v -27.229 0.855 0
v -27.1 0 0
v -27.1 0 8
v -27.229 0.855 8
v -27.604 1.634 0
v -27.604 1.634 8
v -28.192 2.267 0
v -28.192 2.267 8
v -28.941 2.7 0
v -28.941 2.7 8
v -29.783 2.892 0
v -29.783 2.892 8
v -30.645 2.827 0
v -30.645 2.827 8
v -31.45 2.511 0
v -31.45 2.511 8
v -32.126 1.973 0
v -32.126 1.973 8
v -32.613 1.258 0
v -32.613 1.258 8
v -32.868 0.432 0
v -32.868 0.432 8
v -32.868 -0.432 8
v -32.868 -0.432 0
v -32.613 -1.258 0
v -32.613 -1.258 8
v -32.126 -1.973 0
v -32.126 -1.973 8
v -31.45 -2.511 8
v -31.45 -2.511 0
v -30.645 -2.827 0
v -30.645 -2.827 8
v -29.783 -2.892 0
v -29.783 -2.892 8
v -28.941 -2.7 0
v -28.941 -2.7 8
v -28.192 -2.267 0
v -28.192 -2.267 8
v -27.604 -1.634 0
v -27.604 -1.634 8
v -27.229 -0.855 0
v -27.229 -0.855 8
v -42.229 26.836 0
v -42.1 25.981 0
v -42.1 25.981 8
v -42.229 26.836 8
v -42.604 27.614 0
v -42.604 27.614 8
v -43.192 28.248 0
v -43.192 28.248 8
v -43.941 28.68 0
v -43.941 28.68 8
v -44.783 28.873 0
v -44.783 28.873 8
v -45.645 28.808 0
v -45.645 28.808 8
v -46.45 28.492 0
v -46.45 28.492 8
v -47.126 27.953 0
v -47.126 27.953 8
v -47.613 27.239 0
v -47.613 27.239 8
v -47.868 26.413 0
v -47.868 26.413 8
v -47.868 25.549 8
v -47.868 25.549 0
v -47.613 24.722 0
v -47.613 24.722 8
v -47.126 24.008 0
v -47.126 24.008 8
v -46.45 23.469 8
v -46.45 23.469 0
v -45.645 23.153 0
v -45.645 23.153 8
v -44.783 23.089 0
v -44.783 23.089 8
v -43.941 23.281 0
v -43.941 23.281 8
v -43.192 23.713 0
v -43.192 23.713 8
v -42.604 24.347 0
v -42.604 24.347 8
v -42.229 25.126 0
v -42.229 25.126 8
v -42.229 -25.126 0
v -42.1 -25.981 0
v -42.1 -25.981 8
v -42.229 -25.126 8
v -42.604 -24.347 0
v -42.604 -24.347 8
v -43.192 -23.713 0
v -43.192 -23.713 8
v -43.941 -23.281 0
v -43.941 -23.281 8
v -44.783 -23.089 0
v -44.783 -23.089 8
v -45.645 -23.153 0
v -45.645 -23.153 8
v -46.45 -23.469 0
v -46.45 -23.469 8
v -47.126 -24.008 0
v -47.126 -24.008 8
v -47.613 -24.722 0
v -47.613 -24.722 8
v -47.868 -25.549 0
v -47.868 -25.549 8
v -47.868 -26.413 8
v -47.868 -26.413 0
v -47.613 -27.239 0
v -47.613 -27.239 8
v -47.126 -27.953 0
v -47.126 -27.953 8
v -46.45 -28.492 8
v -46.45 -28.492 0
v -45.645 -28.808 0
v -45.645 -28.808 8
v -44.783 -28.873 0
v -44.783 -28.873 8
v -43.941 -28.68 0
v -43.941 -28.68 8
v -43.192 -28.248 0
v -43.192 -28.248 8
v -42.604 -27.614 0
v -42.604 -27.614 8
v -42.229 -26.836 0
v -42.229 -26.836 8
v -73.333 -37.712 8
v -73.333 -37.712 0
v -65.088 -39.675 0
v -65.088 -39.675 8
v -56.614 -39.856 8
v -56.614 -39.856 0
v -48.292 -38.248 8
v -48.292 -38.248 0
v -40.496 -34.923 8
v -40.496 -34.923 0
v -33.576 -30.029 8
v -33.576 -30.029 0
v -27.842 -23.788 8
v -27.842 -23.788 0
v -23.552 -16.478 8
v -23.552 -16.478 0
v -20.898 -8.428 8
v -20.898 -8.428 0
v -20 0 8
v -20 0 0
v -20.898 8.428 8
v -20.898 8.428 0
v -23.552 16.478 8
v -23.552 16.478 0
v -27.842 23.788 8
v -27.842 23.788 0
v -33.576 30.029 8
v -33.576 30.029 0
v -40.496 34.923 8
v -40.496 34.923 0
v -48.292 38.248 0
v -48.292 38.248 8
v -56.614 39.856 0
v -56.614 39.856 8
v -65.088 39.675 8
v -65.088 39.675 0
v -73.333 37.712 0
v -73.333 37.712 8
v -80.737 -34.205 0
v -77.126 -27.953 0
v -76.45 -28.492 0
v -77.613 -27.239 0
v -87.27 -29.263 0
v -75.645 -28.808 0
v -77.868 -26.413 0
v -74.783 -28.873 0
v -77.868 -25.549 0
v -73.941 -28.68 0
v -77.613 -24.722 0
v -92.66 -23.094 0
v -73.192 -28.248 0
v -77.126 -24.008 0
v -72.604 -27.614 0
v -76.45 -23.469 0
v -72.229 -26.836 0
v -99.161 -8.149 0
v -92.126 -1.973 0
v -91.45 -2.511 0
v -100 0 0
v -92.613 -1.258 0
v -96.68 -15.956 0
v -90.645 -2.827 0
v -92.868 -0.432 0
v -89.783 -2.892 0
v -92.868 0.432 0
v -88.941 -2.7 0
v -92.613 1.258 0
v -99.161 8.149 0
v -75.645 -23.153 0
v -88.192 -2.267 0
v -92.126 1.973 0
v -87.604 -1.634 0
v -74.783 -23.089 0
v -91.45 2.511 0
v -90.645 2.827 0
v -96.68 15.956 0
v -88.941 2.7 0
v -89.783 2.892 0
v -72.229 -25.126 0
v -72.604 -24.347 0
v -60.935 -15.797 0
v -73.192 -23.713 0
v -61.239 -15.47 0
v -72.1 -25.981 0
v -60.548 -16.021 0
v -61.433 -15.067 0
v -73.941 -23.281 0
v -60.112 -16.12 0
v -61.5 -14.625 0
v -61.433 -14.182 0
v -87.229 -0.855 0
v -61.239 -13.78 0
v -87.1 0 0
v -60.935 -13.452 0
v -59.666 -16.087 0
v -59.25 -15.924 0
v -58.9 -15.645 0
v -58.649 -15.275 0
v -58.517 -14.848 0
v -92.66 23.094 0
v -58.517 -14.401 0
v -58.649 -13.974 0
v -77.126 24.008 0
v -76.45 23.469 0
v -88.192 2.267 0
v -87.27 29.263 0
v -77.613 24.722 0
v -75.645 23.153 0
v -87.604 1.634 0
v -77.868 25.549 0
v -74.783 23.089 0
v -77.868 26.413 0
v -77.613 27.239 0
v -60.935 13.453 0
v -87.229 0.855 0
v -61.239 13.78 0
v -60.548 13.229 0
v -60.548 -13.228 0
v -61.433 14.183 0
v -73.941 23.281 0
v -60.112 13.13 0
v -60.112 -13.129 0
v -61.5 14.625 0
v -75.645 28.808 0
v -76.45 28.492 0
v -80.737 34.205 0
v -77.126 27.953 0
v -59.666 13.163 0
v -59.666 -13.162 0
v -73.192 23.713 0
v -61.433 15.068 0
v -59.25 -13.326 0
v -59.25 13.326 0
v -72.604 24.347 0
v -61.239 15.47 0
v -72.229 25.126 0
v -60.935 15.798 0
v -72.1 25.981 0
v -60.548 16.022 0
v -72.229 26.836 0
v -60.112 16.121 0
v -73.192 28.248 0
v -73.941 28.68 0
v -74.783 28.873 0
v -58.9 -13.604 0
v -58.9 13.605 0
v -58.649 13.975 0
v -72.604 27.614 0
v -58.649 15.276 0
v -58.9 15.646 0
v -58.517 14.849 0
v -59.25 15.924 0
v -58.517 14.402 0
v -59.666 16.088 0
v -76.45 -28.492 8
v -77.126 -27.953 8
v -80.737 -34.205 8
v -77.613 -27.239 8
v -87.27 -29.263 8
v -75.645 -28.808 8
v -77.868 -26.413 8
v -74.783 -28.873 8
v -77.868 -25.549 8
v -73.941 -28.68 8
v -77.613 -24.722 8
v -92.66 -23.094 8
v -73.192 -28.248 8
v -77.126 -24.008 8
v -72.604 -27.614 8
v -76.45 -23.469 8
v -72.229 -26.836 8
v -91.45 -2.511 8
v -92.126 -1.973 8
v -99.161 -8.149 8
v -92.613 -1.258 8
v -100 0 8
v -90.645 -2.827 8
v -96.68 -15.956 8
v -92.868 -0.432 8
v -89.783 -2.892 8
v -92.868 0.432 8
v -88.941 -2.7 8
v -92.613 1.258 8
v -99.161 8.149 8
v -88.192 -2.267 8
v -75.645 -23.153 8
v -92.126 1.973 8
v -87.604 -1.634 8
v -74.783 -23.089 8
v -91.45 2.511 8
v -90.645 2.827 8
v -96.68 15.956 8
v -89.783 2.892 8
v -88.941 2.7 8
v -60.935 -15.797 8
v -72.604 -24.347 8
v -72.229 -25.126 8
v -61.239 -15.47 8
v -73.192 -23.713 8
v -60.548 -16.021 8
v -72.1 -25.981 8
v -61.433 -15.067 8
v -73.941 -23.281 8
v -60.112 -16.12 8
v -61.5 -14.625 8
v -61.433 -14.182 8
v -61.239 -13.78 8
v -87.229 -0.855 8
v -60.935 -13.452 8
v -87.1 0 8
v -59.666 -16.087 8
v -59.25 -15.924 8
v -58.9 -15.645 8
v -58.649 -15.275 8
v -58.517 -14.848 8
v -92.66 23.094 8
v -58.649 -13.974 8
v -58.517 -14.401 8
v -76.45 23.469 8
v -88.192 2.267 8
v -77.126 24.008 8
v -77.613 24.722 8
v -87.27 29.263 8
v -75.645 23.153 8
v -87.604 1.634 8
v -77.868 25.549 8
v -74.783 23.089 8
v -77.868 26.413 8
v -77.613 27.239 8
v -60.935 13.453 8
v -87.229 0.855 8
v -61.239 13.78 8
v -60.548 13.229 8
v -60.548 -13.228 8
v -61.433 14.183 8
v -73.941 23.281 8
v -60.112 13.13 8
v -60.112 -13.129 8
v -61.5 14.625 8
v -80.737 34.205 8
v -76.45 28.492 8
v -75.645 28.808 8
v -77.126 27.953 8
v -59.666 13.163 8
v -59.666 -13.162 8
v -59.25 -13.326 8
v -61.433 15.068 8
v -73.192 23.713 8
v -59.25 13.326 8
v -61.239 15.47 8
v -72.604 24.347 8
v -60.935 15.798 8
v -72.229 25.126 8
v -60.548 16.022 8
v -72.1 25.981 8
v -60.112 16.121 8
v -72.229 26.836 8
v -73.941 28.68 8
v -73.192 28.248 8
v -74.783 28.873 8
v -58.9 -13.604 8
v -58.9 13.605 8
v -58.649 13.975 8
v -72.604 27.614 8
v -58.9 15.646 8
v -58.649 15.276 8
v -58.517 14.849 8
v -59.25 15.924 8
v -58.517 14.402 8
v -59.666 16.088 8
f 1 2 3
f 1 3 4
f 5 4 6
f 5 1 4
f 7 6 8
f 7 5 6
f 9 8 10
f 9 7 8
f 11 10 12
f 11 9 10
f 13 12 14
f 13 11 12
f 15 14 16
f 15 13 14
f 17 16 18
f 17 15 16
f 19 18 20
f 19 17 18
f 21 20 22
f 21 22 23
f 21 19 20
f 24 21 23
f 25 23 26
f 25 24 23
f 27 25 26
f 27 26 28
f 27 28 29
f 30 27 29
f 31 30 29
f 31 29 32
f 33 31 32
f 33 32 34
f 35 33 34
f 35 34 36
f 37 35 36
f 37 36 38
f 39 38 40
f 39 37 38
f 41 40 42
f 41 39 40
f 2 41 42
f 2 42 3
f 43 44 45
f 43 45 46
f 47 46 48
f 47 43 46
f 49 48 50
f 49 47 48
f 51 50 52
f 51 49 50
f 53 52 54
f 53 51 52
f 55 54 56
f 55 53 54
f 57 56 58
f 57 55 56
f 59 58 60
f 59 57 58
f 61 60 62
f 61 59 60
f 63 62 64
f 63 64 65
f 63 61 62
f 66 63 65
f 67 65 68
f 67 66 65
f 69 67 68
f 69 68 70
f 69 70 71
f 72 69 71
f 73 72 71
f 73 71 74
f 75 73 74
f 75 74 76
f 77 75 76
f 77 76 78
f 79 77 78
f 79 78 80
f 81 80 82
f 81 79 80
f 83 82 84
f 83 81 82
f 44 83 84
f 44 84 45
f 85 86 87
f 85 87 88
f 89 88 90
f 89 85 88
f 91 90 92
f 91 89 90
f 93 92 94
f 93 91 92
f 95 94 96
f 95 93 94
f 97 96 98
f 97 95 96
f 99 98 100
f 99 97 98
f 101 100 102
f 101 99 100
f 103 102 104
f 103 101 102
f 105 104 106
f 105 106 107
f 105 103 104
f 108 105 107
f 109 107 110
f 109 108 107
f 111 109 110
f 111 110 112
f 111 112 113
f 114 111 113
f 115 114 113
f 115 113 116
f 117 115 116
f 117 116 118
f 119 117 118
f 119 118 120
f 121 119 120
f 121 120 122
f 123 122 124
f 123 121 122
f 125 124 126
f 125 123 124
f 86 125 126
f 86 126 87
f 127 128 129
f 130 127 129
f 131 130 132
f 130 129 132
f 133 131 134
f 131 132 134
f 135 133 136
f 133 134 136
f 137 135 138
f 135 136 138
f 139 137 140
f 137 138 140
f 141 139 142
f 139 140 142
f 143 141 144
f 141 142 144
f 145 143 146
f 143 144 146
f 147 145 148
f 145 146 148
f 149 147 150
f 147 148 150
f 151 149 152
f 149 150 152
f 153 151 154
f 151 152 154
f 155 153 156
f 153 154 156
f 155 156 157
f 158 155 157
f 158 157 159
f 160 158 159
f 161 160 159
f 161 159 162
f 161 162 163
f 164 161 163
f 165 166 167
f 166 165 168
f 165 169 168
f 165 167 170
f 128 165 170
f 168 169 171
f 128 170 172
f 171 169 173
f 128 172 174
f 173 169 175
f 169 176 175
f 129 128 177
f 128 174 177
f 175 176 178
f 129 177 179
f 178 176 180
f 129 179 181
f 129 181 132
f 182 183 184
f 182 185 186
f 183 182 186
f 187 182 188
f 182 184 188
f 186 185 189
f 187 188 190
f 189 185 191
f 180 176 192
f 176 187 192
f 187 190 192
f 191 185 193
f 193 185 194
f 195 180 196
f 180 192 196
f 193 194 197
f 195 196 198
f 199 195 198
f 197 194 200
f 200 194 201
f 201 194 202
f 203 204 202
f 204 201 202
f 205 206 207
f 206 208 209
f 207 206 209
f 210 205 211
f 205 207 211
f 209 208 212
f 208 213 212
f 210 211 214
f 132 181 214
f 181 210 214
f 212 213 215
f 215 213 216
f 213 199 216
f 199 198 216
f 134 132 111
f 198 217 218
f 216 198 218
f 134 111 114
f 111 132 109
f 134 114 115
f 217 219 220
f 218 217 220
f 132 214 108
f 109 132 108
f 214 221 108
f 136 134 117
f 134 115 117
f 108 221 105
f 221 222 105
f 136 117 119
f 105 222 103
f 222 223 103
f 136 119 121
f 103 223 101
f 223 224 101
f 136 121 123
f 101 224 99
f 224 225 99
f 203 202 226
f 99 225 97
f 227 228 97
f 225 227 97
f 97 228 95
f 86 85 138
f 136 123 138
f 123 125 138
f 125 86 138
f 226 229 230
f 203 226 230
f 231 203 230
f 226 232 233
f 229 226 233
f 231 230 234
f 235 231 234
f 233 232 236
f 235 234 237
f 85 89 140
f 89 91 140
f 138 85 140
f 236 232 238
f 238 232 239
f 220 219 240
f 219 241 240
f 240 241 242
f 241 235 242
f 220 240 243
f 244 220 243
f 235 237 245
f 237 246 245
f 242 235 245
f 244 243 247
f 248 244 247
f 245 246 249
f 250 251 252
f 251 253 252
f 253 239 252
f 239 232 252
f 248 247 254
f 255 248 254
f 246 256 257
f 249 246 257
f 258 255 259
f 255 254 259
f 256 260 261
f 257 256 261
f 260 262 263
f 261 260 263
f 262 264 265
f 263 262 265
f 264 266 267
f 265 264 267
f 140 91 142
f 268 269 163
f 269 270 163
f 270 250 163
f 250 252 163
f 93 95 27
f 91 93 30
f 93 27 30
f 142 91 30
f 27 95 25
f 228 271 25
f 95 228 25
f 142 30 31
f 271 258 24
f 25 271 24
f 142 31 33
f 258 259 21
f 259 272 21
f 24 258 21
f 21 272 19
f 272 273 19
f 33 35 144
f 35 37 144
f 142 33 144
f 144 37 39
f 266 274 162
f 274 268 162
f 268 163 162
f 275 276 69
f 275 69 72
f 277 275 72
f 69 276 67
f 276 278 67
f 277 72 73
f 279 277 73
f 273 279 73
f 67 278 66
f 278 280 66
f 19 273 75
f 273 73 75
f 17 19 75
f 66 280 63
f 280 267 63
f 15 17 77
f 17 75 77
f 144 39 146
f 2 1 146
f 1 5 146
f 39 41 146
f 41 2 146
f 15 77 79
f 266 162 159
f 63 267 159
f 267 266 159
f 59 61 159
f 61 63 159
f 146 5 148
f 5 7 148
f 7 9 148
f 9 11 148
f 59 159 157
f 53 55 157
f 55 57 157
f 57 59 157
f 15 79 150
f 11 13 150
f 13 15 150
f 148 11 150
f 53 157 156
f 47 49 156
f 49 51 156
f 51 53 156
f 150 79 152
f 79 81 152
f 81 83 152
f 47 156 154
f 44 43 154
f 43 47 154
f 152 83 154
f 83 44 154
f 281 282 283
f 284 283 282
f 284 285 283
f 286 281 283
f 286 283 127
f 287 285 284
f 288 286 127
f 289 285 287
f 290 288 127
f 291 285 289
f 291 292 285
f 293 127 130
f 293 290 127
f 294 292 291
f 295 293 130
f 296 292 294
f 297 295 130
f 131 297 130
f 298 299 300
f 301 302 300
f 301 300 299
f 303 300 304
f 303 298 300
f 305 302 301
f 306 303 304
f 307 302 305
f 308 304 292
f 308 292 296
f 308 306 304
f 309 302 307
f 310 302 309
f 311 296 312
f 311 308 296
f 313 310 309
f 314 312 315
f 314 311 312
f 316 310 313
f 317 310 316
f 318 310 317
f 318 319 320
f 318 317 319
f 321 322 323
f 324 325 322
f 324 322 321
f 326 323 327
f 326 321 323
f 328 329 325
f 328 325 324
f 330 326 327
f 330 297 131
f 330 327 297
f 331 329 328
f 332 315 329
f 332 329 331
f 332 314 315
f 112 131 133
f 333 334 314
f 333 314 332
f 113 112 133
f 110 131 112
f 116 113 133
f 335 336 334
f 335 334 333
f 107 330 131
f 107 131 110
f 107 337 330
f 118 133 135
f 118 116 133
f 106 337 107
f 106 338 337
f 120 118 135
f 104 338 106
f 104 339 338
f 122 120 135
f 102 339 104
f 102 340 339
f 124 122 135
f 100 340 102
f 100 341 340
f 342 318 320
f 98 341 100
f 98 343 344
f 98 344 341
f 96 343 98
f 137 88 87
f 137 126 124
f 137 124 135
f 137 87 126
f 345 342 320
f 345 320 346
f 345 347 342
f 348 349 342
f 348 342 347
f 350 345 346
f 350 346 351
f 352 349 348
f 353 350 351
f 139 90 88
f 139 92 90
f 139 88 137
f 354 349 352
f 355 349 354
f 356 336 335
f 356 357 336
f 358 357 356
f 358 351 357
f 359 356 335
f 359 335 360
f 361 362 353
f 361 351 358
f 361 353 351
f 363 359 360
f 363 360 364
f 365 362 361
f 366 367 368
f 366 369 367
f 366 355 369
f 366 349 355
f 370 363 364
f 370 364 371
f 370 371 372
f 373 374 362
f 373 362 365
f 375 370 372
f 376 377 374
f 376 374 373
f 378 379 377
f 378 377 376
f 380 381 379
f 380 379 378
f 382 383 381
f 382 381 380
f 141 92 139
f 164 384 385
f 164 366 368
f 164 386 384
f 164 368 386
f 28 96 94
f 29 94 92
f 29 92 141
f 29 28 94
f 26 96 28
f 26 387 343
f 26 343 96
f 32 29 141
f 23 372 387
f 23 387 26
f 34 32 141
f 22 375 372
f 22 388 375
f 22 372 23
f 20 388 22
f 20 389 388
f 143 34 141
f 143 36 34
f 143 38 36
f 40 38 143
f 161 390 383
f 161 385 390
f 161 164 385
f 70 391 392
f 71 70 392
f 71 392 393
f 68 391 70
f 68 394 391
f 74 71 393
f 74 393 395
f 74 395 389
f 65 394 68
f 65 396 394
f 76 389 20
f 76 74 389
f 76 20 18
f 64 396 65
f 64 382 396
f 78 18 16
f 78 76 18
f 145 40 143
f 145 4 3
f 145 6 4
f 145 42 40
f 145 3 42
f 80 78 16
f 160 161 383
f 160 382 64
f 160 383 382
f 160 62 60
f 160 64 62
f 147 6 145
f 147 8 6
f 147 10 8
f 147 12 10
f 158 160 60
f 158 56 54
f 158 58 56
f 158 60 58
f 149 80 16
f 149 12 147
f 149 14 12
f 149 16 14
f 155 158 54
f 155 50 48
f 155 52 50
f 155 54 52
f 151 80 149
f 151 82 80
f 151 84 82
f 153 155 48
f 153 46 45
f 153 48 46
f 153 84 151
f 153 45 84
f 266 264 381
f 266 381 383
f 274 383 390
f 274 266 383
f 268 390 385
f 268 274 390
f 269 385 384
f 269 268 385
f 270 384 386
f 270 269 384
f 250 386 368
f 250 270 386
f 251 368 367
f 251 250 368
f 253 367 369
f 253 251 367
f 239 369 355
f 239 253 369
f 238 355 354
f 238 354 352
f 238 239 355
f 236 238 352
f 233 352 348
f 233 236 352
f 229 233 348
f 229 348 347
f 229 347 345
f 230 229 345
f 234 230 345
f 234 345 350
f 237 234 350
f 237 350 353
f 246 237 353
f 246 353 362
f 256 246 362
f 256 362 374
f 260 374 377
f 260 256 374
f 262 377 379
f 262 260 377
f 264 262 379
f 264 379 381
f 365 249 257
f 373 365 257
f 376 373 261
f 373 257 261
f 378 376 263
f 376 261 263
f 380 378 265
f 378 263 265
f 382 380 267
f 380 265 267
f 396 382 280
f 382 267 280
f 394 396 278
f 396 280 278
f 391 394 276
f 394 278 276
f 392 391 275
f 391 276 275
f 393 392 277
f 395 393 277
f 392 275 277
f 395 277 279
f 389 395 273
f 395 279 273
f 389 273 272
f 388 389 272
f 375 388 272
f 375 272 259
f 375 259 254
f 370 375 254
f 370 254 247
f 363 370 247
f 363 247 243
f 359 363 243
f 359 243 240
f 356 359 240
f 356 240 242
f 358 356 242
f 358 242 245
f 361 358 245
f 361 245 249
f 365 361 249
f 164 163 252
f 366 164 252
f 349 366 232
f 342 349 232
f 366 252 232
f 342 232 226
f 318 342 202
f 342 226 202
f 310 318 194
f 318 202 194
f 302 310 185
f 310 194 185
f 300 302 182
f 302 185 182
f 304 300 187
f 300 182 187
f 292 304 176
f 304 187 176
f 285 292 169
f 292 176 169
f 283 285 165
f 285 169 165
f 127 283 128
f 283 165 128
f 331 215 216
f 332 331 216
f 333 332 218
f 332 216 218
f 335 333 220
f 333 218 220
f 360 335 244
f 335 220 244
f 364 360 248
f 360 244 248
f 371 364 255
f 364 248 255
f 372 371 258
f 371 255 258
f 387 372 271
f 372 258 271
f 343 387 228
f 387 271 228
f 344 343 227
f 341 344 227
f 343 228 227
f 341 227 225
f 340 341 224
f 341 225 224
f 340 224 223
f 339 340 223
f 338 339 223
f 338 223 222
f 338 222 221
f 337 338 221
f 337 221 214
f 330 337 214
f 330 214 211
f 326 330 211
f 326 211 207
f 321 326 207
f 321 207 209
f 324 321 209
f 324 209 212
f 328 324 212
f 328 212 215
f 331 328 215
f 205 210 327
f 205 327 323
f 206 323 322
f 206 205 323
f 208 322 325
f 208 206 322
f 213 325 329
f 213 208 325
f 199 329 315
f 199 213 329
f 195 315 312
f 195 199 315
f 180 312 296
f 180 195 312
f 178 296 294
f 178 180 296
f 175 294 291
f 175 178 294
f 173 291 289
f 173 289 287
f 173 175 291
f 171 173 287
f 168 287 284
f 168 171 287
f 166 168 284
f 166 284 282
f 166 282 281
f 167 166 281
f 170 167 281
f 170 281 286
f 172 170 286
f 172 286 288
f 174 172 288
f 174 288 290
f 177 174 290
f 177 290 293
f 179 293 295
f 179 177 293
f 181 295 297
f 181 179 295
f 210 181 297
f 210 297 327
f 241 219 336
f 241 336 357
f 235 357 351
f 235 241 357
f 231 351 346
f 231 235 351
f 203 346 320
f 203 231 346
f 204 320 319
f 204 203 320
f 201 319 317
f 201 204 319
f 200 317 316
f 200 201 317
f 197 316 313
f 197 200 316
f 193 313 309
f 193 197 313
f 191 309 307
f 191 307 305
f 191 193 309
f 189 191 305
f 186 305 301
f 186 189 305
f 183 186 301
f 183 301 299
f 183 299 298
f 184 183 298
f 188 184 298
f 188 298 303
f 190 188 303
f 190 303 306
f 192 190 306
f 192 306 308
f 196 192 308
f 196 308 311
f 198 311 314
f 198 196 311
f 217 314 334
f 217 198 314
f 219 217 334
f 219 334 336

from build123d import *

# Parameters (mm, degrees)
BOSS_EXTRU_1_DEPTH       = 8
ENL_V_START              = -10
ESQUISSE2_R              = 120
ENL_V_MAT_EXTRU_1_DEPTH  = 10
D_GAGEMENT_M51_OUTLINE_R = 2.9
D_GAGEMENT_M51_DEPTH     = 8
ESQUISSE5_R              = 1.5
ENL_V_MAT_EXTRU_2_DEPTH  = 10


# Read off the part's stored shape, not the designer's step: Dégagement M51
with BuildPart() as part:
    # Esquisse1 → Boss.-Extru.1 (new body)
    with BuildSketch(Plane.XY):
        with BuildLine():
            Line((-20, 56.568542495), (-73.333333333, 37.712361663))
            ThreePointArc((-73.333333333, 37.712361663), (-100, 0), (-73.333333333, -37.712361663))
            Line((-73.333333333, -37.712361663), (-20, -56.568542495))
            ThreePointArc((-20, -56.568542495), (34.641016151, -48.989794856), (60, 0))
            ThreePointArc((60, 0), (34.641016151, 48.989794856), (-20, 56.568542495))
        make_face()
    extrude(amount=BOSS_EXTRU_1_DEPTH)

    # Esquisse2 → Enlèv. mat.-Extru.1 (cut)
    with BuildSketch(Plane.XY.offset(8).offset(ENL_V_START)):
        with Locations((-60, 0)):
            Circle(ESQUISSE2_R)
        with BuildLine():
            ThreePointArc((-73.333333333, 37.712361663), (-100, 0), (-73.333333333, -37.712361663))
            ThreePointArc((-73.333333333, -37.712361663), (-20, 0), (-73.333333333, 37.712361663))
        make_face(mode=Mode.SUBTRACT)
    extrude(amount=ENL_V_MAT_EXTRU_1_DEPTH, mode=Mode.SUBTRACT)

    # Dégagement M51 outline → Dégagement M51 (cut)
    with BuildSketch(Plane.XY):
        with Locations((-90, 0)):
            Circle(D_GAGEMENT_M51_OUTLINE_R)
        with Locations((-75, -25.980762114)):
            Circle(D_GAGEMENT_M51_OUTLINE_R)
        with Locations((-45, -25.980762114)):
            Circle(D_GAGEMENT_M51_OUTLINE_R)
        with Locations((-30, 0)):
            Circle(D_GAGEMENT_M51_OUTLINE_R)
        with Locations((-45, 25.980762114)):
            Circle(D_GAGEMENT_M51_OUTLINE_R)
        with Locations((-75, 25.980762114)):
            Circle(D_GAGEMENT_M51_OUTLINE_R)
    extrude(amount=D_GAGEMENT_M51_DEPTH, mode=Mode.SUBTRACT)

    # Esquisse5 → Enlèv. mat.-Extru.2 (cut)
    with BuildSketch(Plane(origin=(819.686269666, 1346.410161514, 0), x_dir=(0, -1, 0), z_dir=(0, 0, -1))):
        with Locations(Location((1331.784714909, 879.686269666, 0), (0, 0, 90))):
            Circle(ESQUISSE5_R)
        with Locations(Location((1361.034715705, 879.686269666, 0), (0, 0, 90))):
            Circle(ESQUISSE5_R)
    extrude(amount=-ENL_V_MAT_EXTRU_2_DEPTH, mode=Mode.SUBTRACT)


solid = part.part
